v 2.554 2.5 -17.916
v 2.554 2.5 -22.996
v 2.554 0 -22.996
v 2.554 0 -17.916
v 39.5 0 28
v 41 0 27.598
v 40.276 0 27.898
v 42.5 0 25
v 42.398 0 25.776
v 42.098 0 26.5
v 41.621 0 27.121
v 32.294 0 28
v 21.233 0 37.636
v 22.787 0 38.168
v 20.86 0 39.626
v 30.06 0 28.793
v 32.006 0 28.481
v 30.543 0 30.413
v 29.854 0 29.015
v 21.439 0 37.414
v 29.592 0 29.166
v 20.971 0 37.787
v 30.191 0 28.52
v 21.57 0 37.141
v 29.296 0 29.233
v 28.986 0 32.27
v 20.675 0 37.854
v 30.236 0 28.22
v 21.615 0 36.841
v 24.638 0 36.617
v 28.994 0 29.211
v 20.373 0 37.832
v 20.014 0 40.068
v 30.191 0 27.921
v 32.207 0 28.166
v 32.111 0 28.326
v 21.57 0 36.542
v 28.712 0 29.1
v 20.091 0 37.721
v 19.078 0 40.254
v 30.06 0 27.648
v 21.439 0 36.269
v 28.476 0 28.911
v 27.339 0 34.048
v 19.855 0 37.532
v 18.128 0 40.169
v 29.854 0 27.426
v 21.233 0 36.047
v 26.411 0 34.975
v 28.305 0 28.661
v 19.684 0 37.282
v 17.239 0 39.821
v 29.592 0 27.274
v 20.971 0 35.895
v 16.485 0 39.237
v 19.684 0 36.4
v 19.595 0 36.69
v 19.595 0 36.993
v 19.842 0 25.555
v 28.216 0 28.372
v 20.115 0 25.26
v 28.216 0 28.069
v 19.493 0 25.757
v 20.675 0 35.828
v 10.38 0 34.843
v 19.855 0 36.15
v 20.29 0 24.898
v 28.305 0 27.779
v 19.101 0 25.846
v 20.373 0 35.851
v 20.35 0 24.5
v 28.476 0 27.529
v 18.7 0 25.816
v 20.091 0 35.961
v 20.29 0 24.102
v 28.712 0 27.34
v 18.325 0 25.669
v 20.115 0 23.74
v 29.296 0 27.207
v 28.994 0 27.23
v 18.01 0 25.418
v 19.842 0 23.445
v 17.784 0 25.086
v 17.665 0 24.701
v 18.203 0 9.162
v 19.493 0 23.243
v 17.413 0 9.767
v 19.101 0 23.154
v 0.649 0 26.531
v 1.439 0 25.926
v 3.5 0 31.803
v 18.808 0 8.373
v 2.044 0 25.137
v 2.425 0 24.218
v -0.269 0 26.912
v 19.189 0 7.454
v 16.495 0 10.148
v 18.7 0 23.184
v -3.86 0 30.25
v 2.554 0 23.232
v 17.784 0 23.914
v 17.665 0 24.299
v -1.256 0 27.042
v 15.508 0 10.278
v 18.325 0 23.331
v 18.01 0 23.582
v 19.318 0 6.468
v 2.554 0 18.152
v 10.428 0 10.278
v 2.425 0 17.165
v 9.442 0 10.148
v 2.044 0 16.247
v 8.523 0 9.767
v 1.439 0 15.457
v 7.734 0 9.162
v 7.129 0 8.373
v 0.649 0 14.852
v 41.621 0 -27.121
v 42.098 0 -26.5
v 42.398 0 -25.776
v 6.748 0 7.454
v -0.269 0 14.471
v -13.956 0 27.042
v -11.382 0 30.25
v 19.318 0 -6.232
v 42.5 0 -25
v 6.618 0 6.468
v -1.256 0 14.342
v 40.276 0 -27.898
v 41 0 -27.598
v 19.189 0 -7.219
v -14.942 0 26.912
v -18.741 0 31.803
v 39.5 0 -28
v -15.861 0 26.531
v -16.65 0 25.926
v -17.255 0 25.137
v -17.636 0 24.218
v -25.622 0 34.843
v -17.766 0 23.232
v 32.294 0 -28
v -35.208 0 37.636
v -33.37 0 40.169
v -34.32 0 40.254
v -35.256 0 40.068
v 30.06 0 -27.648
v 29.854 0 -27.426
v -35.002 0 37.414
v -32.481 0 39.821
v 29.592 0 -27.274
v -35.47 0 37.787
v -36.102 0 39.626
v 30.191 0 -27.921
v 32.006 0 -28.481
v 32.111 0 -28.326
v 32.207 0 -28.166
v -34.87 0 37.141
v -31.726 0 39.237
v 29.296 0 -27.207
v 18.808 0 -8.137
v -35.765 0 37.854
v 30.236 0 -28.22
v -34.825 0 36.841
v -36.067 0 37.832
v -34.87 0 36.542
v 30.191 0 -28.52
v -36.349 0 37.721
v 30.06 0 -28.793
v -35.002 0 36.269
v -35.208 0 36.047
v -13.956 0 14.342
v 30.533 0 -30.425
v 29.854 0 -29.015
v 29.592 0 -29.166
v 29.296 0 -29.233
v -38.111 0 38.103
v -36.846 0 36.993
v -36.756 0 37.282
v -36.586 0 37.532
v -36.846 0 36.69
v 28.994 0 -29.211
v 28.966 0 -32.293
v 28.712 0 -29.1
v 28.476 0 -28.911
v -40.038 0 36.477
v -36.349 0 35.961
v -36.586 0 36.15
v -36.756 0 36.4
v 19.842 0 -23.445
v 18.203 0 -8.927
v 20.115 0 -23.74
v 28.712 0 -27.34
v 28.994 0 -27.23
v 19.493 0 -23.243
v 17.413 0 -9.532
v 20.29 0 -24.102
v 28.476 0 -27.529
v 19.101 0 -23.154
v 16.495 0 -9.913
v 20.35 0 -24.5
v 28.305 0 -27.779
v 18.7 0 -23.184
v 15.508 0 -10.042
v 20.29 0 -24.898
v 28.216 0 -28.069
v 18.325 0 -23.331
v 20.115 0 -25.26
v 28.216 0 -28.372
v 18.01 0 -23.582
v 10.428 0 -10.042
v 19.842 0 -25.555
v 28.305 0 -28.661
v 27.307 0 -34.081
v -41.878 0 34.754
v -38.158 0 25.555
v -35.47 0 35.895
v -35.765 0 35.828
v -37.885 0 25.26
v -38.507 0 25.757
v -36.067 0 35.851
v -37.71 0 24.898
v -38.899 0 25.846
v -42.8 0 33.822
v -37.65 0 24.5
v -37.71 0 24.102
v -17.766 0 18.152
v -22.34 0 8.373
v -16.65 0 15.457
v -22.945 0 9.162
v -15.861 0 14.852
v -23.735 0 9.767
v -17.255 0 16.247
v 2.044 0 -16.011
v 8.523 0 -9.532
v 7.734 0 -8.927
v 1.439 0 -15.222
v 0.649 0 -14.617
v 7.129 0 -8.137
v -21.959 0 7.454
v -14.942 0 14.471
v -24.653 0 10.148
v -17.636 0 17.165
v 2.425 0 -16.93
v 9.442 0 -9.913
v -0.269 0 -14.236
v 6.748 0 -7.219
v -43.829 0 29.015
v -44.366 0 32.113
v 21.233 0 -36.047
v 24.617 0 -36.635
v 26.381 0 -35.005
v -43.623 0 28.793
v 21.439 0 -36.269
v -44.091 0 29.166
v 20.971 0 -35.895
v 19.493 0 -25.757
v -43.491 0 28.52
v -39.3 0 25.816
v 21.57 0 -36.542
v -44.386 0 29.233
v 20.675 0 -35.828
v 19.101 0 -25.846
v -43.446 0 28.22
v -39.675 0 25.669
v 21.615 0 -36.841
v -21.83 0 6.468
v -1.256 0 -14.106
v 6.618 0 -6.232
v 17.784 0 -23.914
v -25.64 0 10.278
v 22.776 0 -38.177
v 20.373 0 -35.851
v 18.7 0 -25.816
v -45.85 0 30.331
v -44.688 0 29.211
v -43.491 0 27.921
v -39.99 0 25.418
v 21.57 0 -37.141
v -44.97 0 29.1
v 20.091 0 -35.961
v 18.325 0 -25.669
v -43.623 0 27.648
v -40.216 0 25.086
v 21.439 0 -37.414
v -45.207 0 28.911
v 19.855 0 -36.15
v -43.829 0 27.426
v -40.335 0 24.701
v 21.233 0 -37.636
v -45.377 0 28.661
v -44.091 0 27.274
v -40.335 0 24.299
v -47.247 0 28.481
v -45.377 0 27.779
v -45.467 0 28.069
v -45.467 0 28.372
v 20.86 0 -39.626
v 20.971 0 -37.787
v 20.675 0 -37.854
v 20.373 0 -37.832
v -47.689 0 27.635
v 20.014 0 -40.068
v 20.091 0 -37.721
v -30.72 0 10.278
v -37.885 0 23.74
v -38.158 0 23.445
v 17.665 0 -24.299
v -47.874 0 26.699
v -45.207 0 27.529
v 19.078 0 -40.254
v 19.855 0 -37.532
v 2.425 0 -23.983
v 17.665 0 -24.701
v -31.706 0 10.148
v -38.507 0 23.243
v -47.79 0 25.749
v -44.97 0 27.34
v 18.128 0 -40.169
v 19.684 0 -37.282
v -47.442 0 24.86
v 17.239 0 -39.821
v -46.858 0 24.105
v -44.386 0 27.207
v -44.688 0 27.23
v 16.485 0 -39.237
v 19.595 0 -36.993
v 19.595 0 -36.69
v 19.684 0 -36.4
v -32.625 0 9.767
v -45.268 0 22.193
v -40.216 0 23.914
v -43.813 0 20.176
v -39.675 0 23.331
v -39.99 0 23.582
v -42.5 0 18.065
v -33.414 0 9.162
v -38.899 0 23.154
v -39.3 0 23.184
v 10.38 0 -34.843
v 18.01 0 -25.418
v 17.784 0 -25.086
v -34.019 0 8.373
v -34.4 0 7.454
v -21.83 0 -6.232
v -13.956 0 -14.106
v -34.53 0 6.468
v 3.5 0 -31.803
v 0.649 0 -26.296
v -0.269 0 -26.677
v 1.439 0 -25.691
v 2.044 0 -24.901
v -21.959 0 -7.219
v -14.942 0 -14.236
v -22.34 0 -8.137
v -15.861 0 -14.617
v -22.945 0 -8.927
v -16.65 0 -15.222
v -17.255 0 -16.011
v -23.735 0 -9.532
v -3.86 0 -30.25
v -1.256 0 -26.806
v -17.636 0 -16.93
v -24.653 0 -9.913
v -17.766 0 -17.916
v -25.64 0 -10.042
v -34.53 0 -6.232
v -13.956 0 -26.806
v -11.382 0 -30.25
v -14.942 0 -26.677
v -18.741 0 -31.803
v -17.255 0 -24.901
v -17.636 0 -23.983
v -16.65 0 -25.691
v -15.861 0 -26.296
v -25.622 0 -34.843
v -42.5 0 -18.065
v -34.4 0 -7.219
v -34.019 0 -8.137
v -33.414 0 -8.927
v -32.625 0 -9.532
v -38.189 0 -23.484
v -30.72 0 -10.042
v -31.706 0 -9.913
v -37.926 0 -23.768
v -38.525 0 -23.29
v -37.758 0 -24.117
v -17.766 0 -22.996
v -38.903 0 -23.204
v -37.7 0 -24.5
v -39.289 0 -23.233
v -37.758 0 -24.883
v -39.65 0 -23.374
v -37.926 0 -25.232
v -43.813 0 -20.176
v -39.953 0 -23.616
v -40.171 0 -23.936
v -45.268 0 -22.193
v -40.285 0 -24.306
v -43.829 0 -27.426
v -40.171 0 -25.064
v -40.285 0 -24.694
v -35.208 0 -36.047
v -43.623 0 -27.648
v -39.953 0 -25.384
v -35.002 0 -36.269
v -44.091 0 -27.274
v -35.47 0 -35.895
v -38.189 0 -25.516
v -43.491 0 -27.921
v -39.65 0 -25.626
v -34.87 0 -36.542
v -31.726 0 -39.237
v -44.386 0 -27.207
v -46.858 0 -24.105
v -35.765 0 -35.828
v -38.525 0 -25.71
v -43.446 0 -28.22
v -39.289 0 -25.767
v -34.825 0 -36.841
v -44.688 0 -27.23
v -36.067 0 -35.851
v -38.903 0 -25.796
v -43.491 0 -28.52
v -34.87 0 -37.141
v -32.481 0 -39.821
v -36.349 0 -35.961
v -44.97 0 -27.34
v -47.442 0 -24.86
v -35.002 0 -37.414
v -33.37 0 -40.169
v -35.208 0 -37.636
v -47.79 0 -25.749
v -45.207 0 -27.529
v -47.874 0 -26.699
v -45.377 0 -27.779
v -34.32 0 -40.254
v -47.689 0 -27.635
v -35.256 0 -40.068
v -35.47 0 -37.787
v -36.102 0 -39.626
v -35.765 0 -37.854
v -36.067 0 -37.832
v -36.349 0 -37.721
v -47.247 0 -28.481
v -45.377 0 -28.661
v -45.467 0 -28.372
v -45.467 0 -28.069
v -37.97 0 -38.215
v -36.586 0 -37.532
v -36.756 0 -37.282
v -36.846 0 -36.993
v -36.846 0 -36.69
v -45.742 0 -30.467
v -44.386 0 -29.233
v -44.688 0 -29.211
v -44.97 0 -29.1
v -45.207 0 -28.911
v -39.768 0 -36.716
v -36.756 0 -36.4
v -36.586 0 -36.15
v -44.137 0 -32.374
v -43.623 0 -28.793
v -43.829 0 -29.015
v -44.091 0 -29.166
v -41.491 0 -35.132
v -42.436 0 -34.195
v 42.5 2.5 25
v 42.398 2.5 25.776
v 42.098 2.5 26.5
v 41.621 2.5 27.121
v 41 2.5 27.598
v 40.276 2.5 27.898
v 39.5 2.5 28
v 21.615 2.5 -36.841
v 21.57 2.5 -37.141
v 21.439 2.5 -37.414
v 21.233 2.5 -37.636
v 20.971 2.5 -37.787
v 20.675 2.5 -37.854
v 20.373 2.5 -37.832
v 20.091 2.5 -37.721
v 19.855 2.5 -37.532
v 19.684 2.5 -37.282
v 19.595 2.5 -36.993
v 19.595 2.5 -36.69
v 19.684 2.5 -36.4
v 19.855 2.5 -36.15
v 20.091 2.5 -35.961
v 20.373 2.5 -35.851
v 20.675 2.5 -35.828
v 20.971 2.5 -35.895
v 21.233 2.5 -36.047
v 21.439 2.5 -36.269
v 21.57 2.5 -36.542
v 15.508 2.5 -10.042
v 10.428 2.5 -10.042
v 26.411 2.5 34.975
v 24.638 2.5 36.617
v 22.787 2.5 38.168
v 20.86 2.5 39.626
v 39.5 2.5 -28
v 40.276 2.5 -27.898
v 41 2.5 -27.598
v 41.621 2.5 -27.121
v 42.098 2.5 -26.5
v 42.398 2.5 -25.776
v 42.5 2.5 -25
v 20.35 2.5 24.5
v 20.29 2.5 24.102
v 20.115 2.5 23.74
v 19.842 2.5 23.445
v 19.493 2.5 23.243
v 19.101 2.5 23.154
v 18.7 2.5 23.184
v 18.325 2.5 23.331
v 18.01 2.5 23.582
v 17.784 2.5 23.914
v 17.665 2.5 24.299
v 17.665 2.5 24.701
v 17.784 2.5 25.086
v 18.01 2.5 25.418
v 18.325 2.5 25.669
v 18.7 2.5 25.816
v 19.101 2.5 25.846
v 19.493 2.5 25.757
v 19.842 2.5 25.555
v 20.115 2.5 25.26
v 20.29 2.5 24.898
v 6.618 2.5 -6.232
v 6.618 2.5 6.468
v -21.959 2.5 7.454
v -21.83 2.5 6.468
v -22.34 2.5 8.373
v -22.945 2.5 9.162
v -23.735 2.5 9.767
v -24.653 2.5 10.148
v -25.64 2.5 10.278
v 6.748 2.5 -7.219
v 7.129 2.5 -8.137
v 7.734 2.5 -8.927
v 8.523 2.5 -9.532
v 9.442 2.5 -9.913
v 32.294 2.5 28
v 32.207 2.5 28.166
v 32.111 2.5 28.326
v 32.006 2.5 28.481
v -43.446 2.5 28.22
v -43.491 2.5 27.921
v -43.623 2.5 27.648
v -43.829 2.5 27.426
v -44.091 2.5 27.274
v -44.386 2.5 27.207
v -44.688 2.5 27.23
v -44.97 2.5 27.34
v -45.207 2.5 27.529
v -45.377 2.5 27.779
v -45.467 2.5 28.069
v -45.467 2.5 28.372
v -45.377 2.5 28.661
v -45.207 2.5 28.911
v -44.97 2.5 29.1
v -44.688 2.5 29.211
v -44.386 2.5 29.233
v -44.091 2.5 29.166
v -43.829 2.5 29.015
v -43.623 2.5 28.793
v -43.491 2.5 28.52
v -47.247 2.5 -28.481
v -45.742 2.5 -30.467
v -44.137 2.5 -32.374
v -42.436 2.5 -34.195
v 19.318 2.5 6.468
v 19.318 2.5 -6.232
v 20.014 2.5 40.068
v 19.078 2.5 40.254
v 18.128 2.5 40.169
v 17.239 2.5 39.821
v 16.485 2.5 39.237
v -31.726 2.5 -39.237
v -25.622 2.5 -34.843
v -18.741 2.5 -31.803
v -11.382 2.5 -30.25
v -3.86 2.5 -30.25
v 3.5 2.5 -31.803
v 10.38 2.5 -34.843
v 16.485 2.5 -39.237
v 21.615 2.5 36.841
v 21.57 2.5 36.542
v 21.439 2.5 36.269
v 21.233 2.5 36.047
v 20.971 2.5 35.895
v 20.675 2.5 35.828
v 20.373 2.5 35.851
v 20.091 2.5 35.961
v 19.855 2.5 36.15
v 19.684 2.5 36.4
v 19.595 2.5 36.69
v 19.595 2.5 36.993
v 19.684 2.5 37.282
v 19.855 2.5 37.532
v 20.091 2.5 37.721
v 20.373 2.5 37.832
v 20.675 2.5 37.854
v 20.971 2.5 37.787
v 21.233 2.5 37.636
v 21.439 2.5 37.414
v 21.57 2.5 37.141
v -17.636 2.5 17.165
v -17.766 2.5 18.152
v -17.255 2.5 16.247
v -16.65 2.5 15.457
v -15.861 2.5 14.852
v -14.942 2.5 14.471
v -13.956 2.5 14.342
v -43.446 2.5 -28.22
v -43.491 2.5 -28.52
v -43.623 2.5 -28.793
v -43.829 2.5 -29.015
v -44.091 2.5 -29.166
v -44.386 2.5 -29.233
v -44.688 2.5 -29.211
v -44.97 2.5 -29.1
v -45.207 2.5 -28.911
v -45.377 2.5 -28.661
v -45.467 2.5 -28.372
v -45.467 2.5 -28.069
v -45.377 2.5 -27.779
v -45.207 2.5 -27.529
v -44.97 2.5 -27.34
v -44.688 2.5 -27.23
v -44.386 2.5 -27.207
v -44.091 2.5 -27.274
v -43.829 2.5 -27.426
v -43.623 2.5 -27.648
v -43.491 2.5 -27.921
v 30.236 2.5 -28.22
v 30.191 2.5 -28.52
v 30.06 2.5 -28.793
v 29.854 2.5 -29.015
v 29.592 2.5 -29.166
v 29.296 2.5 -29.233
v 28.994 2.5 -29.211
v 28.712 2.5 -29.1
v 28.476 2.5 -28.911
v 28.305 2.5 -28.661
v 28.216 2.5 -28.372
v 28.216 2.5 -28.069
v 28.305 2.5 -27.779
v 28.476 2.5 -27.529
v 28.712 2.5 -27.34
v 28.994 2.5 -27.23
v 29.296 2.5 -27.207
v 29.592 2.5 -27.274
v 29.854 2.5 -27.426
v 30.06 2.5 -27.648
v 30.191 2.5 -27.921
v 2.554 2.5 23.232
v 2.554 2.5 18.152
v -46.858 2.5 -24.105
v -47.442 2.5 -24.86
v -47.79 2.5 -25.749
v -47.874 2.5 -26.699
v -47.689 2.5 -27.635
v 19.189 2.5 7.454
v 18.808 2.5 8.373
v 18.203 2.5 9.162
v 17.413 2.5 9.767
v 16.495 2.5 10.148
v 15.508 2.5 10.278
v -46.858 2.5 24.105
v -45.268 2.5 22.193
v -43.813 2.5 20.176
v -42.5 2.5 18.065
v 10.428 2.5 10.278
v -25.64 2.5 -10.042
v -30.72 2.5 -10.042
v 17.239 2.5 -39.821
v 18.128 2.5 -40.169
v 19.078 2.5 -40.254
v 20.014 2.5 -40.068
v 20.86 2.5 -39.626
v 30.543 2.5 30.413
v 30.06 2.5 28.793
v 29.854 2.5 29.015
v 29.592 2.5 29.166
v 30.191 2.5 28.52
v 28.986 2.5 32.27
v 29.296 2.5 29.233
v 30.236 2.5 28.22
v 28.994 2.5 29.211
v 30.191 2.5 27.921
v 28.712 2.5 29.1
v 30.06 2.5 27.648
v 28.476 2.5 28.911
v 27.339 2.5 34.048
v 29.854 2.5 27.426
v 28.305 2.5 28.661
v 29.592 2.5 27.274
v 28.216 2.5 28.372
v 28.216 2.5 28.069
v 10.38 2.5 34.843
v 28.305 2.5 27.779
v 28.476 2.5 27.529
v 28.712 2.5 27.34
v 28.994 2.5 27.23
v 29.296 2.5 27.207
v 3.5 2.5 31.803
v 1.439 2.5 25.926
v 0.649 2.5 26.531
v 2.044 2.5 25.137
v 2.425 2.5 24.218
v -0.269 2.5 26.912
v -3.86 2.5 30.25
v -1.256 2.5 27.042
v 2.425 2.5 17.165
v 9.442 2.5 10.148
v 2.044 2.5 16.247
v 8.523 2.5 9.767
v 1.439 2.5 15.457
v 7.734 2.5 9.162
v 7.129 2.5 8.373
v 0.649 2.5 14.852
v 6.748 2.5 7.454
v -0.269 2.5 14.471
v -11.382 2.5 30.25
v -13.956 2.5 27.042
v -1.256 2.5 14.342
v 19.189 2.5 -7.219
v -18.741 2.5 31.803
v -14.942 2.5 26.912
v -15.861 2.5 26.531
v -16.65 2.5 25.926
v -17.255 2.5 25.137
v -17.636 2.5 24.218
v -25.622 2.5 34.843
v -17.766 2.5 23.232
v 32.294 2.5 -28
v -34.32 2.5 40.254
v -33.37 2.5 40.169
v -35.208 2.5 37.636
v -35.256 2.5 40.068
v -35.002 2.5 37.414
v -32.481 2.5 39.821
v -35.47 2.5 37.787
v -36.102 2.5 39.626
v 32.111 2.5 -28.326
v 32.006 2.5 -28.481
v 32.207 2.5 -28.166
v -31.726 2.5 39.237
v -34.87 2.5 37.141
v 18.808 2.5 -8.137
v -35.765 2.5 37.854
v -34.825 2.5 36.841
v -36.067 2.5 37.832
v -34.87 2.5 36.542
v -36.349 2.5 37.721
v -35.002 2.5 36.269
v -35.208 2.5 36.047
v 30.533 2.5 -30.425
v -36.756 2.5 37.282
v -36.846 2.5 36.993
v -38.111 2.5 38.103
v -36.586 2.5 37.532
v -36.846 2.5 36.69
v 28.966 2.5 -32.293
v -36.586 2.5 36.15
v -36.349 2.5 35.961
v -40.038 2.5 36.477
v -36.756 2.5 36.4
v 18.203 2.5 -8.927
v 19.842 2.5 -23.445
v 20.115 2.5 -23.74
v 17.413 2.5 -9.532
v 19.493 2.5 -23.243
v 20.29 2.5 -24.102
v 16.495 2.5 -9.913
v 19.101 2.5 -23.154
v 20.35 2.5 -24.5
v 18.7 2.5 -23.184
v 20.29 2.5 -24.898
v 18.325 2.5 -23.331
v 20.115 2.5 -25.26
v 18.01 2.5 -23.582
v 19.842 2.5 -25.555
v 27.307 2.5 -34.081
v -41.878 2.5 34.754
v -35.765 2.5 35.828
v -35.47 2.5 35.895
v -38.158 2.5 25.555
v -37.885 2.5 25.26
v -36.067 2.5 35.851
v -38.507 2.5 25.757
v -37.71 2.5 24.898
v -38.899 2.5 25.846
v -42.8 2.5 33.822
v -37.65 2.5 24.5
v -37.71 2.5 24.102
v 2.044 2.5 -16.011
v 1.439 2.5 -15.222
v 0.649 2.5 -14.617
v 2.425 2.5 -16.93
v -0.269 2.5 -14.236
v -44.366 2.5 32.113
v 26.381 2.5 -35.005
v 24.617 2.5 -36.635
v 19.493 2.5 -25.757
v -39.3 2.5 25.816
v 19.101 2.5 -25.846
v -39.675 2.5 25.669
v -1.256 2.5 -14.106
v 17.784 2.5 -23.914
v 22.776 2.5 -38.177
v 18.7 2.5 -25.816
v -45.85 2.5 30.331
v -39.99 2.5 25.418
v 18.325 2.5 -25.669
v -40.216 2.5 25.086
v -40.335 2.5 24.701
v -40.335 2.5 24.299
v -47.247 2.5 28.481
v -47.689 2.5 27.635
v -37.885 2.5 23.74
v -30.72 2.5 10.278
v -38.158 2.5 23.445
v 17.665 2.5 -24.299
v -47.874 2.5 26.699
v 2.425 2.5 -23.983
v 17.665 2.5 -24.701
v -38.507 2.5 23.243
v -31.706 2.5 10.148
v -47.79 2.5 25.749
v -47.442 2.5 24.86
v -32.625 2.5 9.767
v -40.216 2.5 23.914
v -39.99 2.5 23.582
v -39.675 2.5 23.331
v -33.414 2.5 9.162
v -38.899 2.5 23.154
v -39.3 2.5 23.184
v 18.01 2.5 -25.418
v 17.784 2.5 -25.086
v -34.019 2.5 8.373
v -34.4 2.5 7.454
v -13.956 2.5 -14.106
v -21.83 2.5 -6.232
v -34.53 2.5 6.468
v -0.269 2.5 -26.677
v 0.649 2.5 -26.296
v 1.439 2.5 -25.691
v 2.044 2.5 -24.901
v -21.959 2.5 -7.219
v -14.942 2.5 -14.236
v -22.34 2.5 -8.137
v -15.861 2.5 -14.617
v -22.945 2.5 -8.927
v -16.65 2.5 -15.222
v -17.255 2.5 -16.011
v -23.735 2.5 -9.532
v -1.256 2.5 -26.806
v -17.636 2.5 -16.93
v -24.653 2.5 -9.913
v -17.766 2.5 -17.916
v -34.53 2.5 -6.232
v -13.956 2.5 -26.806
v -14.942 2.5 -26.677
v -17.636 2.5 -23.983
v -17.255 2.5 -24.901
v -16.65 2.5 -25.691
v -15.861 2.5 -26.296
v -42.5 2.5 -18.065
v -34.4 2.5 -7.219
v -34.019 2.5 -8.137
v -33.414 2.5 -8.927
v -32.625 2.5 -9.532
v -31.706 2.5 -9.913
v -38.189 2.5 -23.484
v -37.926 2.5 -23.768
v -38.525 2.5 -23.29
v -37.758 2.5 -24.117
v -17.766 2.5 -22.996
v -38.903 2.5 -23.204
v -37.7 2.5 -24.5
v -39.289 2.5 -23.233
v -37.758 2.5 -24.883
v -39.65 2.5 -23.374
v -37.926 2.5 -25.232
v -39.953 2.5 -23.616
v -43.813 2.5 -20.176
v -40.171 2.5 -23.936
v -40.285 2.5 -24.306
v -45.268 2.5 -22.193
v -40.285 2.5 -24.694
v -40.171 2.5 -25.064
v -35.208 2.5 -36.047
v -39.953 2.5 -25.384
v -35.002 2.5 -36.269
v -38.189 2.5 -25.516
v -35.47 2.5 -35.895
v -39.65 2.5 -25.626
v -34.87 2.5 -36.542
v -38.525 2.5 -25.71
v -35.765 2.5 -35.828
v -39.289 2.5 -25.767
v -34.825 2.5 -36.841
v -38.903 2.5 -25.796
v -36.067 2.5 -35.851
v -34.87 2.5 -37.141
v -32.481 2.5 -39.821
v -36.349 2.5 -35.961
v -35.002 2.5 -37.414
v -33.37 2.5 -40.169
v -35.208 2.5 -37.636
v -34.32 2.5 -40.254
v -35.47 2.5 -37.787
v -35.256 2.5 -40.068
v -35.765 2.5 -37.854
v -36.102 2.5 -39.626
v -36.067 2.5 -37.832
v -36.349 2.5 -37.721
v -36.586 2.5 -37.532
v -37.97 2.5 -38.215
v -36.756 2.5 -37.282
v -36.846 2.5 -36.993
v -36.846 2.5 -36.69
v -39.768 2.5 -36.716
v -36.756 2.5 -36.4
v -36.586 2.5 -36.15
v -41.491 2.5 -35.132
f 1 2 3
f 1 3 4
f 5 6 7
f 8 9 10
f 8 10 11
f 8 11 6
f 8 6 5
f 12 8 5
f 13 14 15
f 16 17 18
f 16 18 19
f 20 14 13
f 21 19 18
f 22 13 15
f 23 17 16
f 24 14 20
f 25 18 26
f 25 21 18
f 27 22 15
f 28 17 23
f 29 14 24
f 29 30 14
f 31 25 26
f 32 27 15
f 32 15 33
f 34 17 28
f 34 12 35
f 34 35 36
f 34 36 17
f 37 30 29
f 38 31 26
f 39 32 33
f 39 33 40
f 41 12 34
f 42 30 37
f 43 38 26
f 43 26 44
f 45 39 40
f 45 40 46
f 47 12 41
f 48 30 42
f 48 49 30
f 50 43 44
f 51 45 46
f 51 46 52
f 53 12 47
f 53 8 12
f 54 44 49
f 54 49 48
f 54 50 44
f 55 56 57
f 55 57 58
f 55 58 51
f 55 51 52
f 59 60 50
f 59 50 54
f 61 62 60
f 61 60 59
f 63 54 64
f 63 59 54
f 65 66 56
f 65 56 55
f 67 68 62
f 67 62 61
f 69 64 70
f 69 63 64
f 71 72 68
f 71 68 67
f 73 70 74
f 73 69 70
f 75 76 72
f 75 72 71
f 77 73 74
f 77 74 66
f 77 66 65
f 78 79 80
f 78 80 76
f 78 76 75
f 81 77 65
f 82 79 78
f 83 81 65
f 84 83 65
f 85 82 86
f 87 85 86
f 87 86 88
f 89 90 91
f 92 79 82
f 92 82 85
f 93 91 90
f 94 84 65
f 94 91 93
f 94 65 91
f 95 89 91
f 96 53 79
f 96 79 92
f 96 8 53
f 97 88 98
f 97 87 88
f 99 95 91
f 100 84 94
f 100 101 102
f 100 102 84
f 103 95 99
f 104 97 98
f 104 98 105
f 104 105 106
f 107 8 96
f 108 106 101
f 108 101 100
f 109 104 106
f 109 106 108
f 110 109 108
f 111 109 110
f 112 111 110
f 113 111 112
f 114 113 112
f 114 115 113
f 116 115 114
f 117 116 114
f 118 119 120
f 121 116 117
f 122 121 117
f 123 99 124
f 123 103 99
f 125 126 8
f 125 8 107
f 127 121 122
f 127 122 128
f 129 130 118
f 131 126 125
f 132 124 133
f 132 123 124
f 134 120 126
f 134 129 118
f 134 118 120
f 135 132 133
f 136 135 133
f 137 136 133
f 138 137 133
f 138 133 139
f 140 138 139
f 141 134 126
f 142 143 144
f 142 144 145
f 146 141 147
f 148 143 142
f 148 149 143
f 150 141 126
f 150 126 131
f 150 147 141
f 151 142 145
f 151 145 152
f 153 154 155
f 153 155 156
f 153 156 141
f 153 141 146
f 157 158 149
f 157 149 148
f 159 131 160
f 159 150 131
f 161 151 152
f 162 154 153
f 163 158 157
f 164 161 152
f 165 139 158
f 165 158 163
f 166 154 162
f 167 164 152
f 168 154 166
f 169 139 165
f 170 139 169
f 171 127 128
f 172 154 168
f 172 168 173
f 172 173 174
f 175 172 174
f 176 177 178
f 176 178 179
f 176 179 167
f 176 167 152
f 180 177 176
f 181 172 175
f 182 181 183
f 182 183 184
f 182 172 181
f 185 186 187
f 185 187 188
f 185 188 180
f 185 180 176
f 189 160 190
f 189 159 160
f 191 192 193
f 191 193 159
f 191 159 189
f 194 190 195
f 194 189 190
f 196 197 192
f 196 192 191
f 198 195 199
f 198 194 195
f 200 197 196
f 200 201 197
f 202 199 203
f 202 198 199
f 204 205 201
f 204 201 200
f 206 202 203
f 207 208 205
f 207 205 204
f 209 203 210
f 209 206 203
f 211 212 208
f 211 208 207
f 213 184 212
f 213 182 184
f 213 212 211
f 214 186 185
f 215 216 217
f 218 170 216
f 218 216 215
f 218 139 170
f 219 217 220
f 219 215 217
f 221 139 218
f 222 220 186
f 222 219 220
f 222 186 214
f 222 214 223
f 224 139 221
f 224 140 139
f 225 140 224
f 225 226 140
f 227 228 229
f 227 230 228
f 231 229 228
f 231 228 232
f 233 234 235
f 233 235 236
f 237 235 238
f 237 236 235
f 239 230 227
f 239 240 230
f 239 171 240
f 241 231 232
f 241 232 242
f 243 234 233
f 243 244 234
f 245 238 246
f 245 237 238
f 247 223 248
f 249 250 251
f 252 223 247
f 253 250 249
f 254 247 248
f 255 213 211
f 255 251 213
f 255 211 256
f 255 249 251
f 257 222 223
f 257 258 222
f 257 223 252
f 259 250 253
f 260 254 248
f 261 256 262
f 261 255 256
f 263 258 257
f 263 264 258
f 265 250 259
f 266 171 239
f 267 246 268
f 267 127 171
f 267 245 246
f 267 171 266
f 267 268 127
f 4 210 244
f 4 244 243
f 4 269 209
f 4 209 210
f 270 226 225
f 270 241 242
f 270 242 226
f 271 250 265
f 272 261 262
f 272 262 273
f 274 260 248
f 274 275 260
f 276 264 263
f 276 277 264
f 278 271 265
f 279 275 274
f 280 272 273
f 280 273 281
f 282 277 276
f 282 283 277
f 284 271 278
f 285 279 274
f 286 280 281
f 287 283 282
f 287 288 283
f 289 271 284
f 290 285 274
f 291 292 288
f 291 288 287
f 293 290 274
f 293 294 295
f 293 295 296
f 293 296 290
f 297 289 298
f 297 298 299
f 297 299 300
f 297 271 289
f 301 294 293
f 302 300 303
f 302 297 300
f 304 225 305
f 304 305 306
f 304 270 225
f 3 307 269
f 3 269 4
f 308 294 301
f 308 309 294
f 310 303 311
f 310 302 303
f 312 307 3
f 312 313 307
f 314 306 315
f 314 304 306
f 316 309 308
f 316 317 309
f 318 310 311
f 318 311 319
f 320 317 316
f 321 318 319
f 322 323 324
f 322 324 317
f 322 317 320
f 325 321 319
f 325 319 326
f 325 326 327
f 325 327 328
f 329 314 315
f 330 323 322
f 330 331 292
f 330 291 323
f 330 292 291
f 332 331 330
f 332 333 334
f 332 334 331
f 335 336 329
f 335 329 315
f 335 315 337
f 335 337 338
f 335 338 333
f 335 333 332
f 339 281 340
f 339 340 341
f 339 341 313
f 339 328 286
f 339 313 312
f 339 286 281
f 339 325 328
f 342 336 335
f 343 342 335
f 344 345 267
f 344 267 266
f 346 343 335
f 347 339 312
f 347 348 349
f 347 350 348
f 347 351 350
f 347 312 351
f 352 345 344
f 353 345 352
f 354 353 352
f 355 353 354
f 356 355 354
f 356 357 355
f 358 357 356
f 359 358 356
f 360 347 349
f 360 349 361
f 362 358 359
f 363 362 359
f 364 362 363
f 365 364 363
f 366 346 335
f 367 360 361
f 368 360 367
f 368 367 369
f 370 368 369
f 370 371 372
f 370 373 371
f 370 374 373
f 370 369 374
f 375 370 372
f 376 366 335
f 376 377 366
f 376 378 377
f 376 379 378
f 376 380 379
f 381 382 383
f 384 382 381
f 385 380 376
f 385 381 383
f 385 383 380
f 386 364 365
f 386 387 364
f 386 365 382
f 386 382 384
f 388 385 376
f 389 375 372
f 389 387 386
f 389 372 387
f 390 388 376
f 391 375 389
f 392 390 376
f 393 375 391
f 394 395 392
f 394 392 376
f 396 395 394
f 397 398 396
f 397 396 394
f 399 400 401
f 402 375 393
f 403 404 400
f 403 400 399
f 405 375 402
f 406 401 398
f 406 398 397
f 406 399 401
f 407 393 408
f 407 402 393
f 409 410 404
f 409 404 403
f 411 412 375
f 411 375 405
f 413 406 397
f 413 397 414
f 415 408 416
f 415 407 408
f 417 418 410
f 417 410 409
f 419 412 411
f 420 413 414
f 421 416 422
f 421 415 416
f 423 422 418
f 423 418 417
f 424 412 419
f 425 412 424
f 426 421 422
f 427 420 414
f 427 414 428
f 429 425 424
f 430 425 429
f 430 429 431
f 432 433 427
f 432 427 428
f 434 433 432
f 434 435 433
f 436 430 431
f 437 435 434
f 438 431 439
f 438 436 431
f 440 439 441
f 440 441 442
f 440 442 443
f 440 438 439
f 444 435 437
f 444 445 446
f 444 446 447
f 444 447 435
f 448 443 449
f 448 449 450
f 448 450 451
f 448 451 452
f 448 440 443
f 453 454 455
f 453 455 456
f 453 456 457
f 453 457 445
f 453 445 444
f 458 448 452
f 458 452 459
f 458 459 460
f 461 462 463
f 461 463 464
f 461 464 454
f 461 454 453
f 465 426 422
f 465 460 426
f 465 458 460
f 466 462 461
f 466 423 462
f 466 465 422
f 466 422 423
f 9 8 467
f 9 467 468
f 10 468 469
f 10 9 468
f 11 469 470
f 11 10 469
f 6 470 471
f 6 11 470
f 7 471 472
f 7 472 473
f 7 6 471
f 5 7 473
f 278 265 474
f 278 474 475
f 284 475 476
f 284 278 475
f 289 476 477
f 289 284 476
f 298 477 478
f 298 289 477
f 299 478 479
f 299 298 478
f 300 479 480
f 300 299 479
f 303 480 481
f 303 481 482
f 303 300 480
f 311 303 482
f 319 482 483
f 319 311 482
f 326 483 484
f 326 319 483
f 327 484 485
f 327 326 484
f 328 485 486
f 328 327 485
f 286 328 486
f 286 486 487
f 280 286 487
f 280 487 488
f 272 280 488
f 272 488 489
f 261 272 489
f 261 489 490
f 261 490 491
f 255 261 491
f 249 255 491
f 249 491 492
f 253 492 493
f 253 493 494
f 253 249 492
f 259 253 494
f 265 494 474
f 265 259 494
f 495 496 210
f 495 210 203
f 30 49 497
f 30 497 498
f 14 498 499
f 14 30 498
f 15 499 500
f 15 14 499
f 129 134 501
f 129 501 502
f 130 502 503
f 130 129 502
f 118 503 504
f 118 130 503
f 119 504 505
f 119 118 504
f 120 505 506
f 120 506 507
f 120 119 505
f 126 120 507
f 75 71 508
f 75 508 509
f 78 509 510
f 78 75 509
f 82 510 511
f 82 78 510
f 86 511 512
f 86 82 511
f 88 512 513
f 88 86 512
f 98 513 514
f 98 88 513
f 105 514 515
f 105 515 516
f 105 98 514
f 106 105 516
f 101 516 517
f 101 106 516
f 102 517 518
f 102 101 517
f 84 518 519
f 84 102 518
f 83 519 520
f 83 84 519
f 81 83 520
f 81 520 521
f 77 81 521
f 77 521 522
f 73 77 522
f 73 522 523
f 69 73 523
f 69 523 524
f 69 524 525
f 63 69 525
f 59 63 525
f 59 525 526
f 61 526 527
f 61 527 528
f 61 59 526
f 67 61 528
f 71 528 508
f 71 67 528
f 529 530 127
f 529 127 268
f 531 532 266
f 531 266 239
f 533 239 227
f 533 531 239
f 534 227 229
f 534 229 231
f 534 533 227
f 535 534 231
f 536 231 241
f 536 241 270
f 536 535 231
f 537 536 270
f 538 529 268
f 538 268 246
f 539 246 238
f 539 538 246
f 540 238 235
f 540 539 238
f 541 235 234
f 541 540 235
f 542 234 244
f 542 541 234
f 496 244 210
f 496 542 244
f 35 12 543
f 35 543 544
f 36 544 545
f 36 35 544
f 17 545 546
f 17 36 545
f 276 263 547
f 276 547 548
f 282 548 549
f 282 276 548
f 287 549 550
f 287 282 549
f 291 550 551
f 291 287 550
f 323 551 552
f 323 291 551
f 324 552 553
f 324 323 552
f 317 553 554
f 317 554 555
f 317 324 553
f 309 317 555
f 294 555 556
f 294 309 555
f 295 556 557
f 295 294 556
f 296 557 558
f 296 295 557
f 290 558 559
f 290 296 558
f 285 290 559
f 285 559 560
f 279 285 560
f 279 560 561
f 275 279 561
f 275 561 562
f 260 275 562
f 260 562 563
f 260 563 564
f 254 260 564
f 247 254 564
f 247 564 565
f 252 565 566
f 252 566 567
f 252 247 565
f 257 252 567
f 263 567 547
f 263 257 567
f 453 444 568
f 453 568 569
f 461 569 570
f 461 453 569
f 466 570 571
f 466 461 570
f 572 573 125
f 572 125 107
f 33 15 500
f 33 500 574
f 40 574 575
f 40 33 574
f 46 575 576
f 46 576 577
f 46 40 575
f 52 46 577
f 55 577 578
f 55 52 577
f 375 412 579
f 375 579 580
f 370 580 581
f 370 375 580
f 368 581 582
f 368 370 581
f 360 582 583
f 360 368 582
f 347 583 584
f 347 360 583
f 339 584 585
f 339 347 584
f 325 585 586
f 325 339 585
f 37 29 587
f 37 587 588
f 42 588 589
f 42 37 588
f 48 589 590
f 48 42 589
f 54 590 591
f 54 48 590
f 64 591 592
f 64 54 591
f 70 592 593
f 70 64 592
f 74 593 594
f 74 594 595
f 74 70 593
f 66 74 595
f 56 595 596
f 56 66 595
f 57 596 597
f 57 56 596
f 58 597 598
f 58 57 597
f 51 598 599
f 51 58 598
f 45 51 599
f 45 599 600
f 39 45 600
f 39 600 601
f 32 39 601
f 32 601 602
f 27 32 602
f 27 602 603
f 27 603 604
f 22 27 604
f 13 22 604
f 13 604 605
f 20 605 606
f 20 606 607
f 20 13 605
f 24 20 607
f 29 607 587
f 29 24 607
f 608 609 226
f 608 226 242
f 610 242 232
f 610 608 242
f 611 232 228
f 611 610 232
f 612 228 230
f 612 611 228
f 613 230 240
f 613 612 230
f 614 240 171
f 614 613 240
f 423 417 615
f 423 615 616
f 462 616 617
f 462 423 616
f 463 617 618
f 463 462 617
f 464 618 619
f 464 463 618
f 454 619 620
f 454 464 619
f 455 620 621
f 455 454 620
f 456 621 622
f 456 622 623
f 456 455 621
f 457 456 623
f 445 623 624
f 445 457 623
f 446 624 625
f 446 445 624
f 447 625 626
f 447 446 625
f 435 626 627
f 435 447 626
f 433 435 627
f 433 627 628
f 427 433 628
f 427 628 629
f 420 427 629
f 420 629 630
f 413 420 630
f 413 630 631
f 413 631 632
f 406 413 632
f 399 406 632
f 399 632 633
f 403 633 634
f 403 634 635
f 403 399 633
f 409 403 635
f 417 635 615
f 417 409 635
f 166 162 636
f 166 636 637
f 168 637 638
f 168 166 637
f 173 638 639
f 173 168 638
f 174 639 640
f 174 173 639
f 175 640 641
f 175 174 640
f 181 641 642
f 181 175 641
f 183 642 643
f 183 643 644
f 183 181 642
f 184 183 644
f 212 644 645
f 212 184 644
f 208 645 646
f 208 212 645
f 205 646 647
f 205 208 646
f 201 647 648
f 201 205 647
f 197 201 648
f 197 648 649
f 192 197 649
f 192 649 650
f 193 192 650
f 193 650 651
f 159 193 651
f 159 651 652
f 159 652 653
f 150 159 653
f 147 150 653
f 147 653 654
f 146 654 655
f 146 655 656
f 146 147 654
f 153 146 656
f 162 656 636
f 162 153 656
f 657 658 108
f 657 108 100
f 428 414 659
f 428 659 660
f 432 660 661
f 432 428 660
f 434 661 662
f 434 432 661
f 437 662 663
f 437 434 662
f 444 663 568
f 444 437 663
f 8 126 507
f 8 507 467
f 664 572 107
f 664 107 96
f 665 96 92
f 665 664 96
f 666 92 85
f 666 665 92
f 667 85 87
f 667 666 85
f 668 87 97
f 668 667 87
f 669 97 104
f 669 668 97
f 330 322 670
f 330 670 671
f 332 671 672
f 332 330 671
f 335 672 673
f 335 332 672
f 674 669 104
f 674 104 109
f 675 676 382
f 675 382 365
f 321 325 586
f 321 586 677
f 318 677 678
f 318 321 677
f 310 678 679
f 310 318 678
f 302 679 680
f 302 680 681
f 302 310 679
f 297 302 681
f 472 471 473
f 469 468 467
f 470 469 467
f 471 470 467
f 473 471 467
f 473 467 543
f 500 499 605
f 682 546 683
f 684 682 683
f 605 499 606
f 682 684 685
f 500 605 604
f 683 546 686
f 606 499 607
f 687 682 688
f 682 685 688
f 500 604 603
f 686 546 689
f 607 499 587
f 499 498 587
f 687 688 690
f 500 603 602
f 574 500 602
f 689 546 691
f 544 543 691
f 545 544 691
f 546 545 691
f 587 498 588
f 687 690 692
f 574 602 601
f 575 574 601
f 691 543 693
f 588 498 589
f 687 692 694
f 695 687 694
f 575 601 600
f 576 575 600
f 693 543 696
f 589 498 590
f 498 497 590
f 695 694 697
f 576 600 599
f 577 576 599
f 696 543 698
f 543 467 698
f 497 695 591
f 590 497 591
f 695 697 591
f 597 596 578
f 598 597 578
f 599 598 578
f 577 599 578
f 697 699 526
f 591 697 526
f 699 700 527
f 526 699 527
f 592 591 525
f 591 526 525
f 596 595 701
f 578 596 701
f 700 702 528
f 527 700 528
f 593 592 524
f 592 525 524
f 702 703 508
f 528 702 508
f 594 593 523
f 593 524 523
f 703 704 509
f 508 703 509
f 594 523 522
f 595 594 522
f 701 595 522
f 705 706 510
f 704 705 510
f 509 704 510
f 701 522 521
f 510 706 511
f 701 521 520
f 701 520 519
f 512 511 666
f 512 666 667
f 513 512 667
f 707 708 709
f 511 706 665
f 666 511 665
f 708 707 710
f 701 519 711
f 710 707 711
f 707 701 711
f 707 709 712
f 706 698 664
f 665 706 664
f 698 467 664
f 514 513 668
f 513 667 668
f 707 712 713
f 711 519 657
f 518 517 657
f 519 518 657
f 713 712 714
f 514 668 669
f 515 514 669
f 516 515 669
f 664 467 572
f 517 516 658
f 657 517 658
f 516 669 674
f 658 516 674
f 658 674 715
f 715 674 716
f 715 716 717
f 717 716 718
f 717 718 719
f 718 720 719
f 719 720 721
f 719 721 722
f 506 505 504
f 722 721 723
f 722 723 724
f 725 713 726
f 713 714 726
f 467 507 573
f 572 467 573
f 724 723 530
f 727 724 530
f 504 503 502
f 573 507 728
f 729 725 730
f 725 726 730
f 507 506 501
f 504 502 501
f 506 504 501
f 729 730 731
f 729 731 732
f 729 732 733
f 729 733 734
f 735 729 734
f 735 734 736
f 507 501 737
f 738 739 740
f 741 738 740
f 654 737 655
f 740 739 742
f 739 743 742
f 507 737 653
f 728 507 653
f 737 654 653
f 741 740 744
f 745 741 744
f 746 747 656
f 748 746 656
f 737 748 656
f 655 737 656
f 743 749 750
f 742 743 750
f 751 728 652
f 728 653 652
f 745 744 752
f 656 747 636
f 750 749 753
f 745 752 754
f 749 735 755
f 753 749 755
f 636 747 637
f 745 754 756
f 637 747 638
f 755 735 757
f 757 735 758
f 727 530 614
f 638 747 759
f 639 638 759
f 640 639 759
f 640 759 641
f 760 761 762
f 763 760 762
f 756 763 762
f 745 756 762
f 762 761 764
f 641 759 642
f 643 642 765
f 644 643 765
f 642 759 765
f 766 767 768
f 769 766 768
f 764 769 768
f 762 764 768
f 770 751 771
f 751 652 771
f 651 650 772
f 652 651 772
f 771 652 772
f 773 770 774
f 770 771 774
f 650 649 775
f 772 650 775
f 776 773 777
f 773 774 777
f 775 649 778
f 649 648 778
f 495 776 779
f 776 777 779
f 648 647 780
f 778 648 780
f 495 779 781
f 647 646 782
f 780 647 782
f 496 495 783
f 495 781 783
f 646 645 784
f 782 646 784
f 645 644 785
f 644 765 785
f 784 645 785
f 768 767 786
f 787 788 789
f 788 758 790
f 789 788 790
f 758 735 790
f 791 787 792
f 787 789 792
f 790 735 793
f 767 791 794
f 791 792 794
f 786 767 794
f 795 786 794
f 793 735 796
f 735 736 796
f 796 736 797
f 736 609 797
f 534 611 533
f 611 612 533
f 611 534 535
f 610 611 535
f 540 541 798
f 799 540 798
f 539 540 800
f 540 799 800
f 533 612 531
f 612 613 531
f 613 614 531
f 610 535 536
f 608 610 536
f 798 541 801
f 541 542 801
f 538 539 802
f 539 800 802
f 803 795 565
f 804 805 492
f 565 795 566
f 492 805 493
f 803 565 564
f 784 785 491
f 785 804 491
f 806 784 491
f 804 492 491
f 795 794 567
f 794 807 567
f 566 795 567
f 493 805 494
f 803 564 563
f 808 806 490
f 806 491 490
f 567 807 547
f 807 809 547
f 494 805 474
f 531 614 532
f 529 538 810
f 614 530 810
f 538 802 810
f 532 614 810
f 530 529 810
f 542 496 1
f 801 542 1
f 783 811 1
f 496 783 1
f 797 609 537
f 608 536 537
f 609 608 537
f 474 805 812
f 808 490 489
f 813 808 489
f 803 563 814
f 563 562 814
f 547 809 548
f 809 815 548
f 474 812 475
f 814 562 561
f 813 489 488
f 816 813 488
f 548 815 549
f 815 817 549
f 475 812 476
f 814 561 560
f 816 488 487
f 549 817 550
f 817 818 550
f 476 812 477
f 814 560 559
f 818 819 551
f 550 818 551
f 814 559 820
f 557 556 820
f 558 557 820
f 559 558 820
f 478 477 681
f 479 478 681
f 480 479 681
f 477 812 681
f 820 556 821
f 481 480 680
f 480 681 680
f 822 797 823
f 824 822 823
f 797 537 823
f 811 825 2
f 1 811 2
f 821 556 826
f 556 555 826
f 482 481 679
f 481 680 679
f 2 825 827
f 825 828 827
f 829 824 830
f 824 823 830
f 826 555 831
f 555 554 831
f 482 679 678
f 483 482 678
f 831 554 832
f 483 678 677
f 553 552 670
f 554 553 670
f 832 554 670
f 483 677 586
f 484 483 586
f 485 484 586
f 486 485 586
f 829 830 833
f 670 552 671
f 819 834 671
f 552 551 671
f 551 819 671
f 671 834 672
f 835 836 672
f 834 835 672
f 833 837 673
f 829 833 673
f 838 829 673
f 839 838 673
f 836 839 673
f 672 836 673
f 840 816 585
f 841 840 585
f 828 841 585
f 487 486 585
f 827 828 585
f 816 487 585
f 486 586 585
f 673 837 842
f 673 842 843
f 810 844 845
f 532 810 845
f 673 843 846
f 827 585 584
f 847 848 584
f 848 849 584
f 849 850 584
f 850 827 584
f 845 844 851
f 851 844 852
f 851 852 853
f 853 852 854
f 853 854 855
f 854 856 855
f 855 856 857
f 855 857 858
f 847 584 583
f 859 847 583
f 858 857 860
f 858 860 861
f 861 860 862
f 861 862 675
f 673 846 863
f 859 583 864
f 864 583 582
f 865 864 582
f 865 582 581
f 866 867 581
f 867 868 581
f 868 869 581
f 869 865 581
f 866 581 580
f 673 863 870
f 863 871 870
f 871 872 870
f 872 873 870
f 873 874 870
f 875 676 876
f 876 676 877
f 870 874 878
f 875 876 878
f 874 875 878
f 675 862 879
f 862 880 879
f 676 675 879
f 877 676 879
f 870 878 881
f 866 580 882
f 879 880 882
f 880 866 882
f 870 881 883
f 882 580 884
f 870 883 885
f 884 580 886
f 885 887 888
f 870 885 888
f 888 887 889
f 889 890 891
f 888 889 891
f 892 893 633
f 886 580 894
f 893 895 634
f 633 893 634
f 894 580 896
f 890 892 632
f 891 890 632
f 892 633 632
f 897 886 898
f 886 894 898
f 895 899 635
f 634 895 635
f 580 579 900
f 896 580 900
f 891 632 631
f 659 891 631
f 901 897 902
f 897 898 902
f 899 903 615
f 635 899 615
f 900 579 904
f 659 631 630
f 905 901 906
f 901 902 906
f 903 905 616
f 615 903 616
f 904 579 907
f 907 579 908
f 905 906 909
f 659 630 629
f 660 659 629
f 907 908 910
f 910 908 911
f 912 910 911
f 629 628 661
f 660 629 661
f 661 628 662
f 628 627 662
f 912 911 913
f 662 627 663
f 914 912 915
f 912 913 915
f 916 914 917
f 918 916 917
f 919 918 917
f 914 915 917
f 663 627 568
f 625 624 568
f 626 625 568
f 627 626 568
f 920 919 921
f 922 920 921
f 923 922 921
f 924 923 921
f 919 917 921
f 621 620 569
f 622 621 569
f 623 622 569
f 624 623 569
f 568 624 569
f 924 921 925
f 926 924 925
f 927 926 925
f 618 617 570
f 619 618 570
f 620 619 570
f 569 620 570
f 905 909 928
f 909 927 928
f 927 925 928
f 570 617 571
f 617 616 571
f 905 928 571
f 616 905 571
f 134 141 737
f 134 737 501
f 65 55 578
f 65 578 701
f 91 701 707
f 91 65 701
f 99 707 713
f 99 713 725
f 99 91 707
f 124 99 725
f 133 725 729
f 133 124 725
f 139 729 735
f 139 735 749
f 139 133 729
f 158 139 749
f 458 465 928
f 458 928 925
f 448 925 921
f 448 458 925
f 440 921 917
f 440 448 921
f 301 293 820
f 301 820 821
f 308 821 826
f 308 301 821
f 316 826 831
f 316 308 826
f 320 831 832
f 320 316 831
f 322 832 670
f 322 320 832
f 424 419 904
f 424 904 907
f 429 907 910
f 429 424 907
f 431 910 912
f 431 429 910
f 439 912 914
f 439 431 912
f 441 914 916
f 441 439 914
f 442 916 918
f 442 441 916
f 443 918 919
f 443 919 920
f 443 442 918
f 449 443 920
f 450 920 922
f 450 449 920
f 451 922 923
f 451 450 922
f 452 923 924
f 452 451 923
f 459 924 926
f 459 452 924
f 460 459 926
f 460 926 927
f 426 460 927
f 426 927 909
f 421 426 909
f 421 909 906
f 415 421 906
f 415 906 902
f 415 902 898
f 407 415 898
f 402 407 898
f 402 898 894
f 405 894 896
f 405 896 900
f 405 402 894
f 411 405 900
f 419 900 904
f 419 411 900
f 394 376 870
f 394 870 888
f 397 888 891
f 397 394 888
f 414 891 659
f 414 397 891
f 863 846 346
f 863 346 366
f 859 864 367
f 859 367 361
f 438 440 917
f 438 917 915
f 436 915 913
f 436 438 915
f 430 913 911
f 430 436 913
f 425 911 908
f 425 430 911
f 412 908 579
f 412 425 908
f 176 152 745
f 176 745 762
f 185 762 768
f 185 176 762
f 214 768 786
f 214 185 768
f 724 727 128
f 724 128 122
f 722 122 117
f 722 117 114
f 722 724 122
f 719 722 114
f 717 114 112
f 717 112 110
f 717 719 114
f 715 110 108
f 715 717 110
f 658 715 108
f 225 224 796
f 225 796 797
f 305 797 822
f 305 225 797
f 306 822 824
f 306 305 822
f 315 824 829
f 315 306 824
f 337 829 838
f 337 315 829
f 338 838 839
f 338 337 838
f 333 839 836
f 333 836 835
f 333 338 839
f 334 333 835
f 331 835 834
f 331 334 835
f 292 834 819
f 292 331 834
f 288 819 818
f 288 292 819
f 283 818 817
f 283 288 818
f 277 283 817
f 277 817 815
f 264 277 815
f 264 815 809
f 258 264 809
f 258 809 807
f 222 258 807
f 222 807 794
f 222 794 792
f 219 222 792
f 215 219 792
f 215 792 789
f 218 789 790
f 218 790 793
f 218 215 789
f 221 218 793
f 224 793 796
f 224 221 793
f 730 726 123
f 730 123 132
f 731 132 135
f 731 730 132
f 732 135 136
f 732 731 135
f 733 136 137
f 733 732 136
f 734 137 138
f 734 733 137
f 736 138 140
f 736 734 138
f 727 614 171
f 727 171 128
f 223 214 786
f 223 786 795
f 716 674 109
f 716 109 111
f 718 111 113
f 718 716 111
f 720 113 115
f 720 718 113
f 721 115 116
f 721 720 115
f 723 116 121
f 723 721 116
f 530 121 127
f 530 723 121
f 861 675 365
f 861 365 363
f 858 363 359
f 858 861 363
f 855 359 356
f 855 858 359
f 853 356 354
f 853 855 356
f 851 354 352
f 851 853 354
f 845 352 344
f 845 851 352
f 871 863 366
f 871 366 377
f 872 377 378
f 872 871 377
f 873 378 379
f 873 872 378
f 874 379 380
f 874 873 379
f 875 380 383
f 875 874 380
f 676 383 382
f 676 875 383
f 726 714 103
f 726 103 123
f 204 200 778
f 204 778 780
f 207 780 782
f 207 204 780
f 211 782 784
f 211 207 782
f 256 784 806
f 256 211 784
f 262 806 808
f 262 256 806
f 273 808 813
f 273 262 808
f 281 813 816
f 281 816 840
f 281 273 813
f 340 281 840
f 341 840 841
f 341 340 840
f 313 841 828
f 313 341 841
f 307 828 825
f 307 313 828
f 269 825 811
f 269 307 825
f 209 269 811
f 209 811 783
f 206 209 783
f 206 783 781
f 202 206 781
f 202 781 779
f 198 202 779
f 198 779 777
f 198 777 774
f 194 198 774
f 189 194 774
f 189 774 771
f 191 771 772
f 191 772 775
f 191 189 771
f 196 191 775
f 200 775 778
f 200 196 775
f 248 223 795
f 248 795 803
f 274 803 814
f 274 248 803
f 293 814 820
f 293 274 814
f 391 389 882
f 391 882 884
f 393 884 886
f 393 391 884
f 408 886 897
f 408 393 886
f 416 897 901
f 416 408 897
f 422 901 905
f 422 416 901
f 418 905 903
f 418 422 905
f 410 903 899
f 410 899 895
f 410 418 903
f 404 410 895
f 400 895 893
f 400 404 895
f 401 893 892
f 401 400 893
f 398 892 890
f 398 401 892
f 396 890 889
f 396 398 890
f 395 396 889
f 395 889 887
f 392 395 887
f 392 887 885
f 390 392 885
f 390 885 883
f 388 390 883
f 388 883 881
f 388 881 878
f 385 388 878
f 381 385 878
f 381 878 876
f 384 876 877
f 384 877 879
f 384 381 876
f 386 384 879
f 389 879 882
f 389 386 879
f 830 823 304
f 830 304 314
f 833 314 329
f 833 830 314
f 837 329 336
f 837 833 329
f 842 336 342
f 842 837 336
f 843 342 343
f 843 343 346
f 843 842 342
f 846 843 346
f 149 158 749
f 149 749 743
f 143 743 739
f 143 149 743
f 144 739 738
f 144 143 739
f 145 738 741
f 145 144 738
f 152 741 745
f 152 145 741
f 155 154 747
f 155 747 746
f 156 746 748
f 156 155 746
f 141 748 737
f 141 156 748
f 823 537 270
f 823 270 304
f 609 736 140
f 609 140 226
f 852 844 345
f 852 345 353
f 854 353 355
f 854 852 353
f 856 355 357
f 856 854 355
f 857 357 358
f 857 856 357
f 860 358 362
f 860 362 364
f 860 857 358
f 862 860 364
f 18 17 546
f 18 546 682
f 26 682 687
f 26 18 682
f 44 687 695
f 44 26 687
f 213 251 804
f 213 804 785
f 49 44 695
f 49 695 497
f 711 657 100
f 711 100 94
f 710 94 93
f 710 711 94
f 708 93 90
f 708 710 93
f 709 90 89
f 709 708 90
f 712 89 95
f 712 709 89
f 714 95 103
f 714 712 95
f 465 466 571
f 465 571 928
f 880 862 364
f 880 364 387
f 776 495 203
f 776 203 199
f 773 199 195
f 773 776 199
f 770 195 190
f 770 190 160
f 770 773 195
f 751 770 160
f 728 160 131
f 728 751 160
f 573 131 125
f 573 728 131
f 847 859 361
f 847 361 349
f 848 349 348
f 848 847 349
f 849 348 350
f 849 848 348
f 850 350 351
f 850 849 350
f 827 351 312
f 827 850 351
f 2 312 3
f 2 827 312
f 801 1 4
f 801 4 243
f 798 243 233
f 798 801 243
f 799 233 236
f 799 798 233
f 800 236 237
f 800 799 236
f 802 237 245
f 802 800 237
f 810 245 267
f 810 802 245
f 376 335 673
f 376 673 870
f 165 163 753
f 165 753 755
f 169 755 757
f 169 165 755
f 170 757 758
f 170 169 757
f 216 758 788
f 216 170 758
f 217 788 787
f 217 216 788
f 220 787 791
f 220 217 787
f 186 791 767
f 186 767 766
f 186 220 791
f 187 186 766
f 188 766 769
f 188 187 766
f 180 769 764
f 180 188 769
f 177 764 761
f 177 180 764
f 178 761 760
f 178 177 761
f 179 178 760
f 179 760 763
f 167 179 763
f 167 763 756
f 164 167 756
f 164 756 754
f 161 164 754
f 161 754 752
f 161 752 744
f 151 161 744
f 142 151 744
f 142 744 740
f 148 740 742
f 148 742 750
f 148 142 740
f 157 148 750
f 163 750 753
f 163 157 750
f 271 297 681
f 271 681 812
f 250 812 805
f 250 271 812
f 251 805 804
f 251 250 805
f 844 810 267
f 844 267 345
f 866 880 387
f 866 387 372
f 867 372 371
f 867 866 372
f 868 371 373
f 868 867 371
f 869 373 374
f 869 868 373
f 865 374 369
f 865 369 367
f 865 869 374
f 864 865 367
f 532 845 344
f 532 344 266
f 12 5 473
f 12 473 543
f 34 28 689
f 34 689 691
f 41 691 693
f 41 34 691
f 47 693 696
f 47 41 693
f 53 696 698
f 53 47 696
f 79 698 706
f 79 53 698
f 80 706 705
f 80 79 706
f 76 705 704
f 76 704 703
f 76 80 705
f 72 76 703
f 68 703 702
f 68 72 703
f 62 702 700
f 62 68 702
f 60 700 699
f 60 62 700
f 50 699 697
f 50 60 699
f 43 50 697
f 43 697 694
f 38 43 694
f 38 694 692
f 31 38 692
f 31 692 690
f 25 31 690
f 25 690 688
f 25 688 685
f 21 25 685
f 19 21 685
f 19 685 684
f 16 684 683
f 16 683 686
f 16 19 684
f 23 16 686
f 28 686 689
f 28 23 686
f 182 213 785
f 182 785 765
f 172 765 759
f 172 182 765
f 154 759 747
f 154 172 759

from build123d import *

# Parameters (mm, degrees)
SKETCH_4_R          = 1.015999997
EXTRUDE_1_DEPTH     = 2.5
SKETCH_1_R          = 1.35
SKETCH_1_R_2        = 1.3
CUT_EXTRUDE_1_DEPTH = 2.5
CUT_EXTRUDE_2_DEPTH = 2.5


with BuildPart() as part:
    # 草图4 → 凸台-拉伸1 (new body)
    with BuildSketch(Plane(origin=(0, 0, 0), x_dir=(1, 0, 0), z_dir=(0, 1, 0))):
        with BuildLine():
            Line((-42.436188428, 34.195477543), (-41.49137262, 35.131555803))
            ThreePointArc((-41.49137262, 35.131555803), (-38.877647905, 37.476008525), (-36.102115814, 39.626458957))
            ThreePointArc((-36.102115814, 39.626458957), (-33.841762455, 40.245239062), (-31.726243819, 39.236939987))
            ThreePointArc((-31.726243819, 39.236939987), (-7.620828088, 30.054645119), (16.484587642, 39.236939987))
            ThreePointArc((16.484587642, 39.236939987), (18.600106279, 40.245239062), (20.860459637, 39.626458957))
            ThreePointArc((20.860459637, 39.626458957), (23.705991726, 37.417514086), (26.38082366, 35.004680806))
            Line((26.38082366, 35.004680806), (27.30697313, 34.080620624))
            ThreePointArc((27.30697313, 34.080620624), (29.761287419, 31.369052268), (32.005630869, 28.481287726))
            ThreePointArc((32.005630869, 28.481287726), (32.159827034, 28.246667313), (32.293910707, 28))
            Line((32.293910707, 28), (39.5, 28))
            ThreePointArc((39.5, 28), (41.621320344, 27.121320344), (42.5, 25))
            Line((42.5, 25), (42.5, -25))
            ThreePointArc((42.5, -25), (41.621320344, -27.121320344), (39.5, -28))
            Line((39.5, -28), (32.293910707, -28))
            ThreePointArc((32.293910707, -28), (32.159827034, -28.246667313), (32.005630869, -28.481287726))
            ThreePointArc((32.005630869, -28.481287726), (29.775946345, -31.351575111), (27.338818851, -34.047952742))
            Line((27.338818851, -34.047952742), (26.411119263, -34.975227797))
            ThreePointArc((26.411119263, -34.975227797), (23.722187526, -37.403948618), (20.860459637, -39.626458957))
            ThreePointArc((20.860459637, -39.626458957), (18.600106279, -40.245239062), (16.484587642, -39.236939987))
            ThreePointArc((16.484587642, -39.236939987), (-7.620828088, -30.054645119), (-31.726243819, -39.236939987))
            ThreePointArc((-31.726243819, -39.236939987), (-33.841762455, -40.245239062), (-36.102115814, -39.626458957))
            ThreePointArc((-36.102115814, -39.626458957), (-39.084675426, -37.302363339), (-41.878340415, -34.754321303))
            Line((-41.878340415, -34.754321303), (-42.799522233, -33.821583024))
            ThreePointArc((-42.799522233, -33.821583024), (-45.118593637, -31.230715312), (-47.247287045, -28.481287726))
            ThreePointArc((-47.247287045, -28.481287726), (-47.86606715, -26.220934367), (-46.857768075, -24.105415731))
            ThreePointArc((-46.857768075, -24.105415731), (-44.523235736, -21.197270026), (-42.5, -18.064560362))
            Line((-42.5, -18.064560362), (-42.5, 18.064560362))
            ThreePointArc((-42.5, 18.064560362), (-44.523235736, 21.197270026), (-46.857768075, 24.105415731))
            ThreePointArc((-46.857768075, 24.105415731), (-47.86606715, 26.220934367), (-47.247287045, 28.481287726))
            ThreePointArc((-47.247287045, 28.481287726), (-44.951232672, 31.430572594), (-42.436188428, 34.195477543))
        make_face()
        with Locations((20.59934216, 36.841216125)):
            Circle(SKETCH_4_R, mode=Mode.SUBTRACT)
        with Locations((29.220388037, 28.220170249)):
            Circle(SKETCH_4_R, mode=Mode.SUBTRACT)
        with Locations((29.220388037, -28.220170249)):
            Circle(SKETCH_4_R, mode=Mode.SUBTRACT)
        with Locations((20.59934216, -36.841216125)):
            Circle(SKETCH_4_R, mode=Mode.SUBTRACT)
        with Locations((-35.840998337, -36.841216125)):
            Circle(SKETCH_4_R, mode=Mode.SUBTRACT)
        with Locations((-44.462044213, -28.220170249)):
            Circle(SKETCH_4_R, mode=Mode.SUBTRACT)
        with Locations((-35.840998337, 36.841216125)):
            Circle(SKETCH_4_R, mode=Mode.SUBTRACT)
        with Locations((-44.462044213, 28.220170249)):
            Circle(SKETCH_4_R, mode=Mode.SUBTRACT)
    extrude(amount=EXTRUDE_1_DEPTH)

    # 草图1 → 切除-拉伸1 (cut)
    with BuildSketch(Plane(origin=(0, 0, 0), x_dir=(1, 0, 0), z_dir=(0, 1, 0))):
        with Locations((19, -24.5)):
            Circle(SKETCH_1_R)
        with Locations((19, 24.5)):
            Circle(SKETCH_1_R)
        with Locations((-39, -24.5)):
            Circle(SKETCH_1_R)
        with Locations((-39, 24.5)):
            Circle(SKETCH_1_R_2)
    extrude(amount=CUT_EXTRUDE_1_DEPTH, mode=Mode.SUBTRACT)

    # 草图7 → 切除-拉伸2 (cut)
    with BuildSketch(Plane(origin=(0, 2.5, 0), x_dir=(1, 0, 0), z_dir=(0, 1, 0))):
        with BuildLine():
            Line((-1.255512377, -27.041509959), (-13.955512377, -27.041509959))
            ThreePointArc((-13.955512377, -27.041509959), (-16.649589213, -25.925586795), (-17.765512377, -23.231509959))
            Line((-17.765512377, -23.231509959), (-17.765512377, -18.151509959))
            ThreePointArc((-17.765512377, -18.151509959), (-16.649589213, -15.457433122), (-13.955512377, -14.341509959))
            Line((-13.955512377, -14.341509959), (-1.255512377, -14.341509959))
            ThreePointArc((-1.255512377, -14.341509959), (1.43856446, -15.457433122), (2.554487623, -18.151509959))
            Line((2.554487623, -18.151509959), (2.554487623, -23.231509959))
            ThreePointArc((2.554487623, -23.231509959), (1.43856446, -25.925586795), (-1.255512377, -27.041509959))
        make_face()
        with BuildLine():
            Line((6.618487623, -6.467509959), (6.618487623, 6.232490041))
            ThreePointArc((6.618487623, 6.232490041), (7.734410787, 8.926566878), (10.428487623, 10.042490041))
            Line((10.428487623, 10.042490041), (15.508487623, 10.042490041))
            ThreePointArc((15.508487623, 10.042490041), (18.20256446, 8.926566878), (19.318487623, 6.232490041))
            Line((19.318487623, 6.232490041), (19.318487623, -6.467509959))
            ThreePointArc((19.318487623, -6.467509959), (18.20256446, -9.161586795), (15.508487623, -10.277509959))
            Line((15.508487623, -10.277509959), (10.428487623, -10.277509959))
            ThreePointArc((10.428487623, -10.277509959), (7.734410787, -9.161586795), (6.618487623, -6.467509959))
        make_face()
        with BuildLine():
            Line((-1.255512377, 14.106490041), (-13.955512377, 14.106490041))
            ThreePointArc((-13.955512377, 14.106490041), (-16.649589213, 15.222413205), (-17.765512377, 17.916490041))
            Line((-17.765512377, 17.916490041), (-17.765512377, 22.996490041))
            ThreePointArc((-17.765512377, 22.996490041), (-16.649589213, 25.690566878), (-13.955512377, 26.806490041))
            Line((-13.955512377, 26.806490041), (-1.255512377, 26.806490041))
            ThreePointArc((-1.255512377, 26.806490041), (1.43856446, 25.690566878), (2.554487623, 22.996490041))
            Line((2.554487623, 22.996490041), (2.554487623, 17.916490041))
            ThreePointArc((2.554487623, 17.916490041), (1.43856446, 15.222413205), (-1.255512377, 14.106490041))
        make_face()
        with BuildLine():
            Line((-25.639512377, -10.277509959), (-30.719512377, -10.277509959))
            ThreePointArc((-30.719512377, -10.277509959), (-33.413589213, -9.161586795), (-34.529512377, -6.467509959))
            Line((-34.529512377, -6.467509959), (-34.529512377, 6.232490041))
            ThreePointArc((-34.529512377, 6.232490041), (-33.413589213, 8.926566878), (-30.719512377, 10.042490041))
            Line((-30.719512377, 10.042490041), (-25.639512377, 10.042490041))
            ThreePointArc((-25.639512377, 10.042490041), (-22.94543554, 8.926566878), (-21.829512377, 6.232490041))
            Line((-21.829512377, 6.232490041), (-21.829512377, -6.467509959))
            ThreePointArc((-21.829512377, -6.467509959), (-22.94543554, -9.161586795), (-25.639512377, -10.277509959))
        make_face()
    extrude(amount=-CUT_EXTRUDE_2_DEPTH, mode=Mode.SUBTRACT)


solid = part.part
